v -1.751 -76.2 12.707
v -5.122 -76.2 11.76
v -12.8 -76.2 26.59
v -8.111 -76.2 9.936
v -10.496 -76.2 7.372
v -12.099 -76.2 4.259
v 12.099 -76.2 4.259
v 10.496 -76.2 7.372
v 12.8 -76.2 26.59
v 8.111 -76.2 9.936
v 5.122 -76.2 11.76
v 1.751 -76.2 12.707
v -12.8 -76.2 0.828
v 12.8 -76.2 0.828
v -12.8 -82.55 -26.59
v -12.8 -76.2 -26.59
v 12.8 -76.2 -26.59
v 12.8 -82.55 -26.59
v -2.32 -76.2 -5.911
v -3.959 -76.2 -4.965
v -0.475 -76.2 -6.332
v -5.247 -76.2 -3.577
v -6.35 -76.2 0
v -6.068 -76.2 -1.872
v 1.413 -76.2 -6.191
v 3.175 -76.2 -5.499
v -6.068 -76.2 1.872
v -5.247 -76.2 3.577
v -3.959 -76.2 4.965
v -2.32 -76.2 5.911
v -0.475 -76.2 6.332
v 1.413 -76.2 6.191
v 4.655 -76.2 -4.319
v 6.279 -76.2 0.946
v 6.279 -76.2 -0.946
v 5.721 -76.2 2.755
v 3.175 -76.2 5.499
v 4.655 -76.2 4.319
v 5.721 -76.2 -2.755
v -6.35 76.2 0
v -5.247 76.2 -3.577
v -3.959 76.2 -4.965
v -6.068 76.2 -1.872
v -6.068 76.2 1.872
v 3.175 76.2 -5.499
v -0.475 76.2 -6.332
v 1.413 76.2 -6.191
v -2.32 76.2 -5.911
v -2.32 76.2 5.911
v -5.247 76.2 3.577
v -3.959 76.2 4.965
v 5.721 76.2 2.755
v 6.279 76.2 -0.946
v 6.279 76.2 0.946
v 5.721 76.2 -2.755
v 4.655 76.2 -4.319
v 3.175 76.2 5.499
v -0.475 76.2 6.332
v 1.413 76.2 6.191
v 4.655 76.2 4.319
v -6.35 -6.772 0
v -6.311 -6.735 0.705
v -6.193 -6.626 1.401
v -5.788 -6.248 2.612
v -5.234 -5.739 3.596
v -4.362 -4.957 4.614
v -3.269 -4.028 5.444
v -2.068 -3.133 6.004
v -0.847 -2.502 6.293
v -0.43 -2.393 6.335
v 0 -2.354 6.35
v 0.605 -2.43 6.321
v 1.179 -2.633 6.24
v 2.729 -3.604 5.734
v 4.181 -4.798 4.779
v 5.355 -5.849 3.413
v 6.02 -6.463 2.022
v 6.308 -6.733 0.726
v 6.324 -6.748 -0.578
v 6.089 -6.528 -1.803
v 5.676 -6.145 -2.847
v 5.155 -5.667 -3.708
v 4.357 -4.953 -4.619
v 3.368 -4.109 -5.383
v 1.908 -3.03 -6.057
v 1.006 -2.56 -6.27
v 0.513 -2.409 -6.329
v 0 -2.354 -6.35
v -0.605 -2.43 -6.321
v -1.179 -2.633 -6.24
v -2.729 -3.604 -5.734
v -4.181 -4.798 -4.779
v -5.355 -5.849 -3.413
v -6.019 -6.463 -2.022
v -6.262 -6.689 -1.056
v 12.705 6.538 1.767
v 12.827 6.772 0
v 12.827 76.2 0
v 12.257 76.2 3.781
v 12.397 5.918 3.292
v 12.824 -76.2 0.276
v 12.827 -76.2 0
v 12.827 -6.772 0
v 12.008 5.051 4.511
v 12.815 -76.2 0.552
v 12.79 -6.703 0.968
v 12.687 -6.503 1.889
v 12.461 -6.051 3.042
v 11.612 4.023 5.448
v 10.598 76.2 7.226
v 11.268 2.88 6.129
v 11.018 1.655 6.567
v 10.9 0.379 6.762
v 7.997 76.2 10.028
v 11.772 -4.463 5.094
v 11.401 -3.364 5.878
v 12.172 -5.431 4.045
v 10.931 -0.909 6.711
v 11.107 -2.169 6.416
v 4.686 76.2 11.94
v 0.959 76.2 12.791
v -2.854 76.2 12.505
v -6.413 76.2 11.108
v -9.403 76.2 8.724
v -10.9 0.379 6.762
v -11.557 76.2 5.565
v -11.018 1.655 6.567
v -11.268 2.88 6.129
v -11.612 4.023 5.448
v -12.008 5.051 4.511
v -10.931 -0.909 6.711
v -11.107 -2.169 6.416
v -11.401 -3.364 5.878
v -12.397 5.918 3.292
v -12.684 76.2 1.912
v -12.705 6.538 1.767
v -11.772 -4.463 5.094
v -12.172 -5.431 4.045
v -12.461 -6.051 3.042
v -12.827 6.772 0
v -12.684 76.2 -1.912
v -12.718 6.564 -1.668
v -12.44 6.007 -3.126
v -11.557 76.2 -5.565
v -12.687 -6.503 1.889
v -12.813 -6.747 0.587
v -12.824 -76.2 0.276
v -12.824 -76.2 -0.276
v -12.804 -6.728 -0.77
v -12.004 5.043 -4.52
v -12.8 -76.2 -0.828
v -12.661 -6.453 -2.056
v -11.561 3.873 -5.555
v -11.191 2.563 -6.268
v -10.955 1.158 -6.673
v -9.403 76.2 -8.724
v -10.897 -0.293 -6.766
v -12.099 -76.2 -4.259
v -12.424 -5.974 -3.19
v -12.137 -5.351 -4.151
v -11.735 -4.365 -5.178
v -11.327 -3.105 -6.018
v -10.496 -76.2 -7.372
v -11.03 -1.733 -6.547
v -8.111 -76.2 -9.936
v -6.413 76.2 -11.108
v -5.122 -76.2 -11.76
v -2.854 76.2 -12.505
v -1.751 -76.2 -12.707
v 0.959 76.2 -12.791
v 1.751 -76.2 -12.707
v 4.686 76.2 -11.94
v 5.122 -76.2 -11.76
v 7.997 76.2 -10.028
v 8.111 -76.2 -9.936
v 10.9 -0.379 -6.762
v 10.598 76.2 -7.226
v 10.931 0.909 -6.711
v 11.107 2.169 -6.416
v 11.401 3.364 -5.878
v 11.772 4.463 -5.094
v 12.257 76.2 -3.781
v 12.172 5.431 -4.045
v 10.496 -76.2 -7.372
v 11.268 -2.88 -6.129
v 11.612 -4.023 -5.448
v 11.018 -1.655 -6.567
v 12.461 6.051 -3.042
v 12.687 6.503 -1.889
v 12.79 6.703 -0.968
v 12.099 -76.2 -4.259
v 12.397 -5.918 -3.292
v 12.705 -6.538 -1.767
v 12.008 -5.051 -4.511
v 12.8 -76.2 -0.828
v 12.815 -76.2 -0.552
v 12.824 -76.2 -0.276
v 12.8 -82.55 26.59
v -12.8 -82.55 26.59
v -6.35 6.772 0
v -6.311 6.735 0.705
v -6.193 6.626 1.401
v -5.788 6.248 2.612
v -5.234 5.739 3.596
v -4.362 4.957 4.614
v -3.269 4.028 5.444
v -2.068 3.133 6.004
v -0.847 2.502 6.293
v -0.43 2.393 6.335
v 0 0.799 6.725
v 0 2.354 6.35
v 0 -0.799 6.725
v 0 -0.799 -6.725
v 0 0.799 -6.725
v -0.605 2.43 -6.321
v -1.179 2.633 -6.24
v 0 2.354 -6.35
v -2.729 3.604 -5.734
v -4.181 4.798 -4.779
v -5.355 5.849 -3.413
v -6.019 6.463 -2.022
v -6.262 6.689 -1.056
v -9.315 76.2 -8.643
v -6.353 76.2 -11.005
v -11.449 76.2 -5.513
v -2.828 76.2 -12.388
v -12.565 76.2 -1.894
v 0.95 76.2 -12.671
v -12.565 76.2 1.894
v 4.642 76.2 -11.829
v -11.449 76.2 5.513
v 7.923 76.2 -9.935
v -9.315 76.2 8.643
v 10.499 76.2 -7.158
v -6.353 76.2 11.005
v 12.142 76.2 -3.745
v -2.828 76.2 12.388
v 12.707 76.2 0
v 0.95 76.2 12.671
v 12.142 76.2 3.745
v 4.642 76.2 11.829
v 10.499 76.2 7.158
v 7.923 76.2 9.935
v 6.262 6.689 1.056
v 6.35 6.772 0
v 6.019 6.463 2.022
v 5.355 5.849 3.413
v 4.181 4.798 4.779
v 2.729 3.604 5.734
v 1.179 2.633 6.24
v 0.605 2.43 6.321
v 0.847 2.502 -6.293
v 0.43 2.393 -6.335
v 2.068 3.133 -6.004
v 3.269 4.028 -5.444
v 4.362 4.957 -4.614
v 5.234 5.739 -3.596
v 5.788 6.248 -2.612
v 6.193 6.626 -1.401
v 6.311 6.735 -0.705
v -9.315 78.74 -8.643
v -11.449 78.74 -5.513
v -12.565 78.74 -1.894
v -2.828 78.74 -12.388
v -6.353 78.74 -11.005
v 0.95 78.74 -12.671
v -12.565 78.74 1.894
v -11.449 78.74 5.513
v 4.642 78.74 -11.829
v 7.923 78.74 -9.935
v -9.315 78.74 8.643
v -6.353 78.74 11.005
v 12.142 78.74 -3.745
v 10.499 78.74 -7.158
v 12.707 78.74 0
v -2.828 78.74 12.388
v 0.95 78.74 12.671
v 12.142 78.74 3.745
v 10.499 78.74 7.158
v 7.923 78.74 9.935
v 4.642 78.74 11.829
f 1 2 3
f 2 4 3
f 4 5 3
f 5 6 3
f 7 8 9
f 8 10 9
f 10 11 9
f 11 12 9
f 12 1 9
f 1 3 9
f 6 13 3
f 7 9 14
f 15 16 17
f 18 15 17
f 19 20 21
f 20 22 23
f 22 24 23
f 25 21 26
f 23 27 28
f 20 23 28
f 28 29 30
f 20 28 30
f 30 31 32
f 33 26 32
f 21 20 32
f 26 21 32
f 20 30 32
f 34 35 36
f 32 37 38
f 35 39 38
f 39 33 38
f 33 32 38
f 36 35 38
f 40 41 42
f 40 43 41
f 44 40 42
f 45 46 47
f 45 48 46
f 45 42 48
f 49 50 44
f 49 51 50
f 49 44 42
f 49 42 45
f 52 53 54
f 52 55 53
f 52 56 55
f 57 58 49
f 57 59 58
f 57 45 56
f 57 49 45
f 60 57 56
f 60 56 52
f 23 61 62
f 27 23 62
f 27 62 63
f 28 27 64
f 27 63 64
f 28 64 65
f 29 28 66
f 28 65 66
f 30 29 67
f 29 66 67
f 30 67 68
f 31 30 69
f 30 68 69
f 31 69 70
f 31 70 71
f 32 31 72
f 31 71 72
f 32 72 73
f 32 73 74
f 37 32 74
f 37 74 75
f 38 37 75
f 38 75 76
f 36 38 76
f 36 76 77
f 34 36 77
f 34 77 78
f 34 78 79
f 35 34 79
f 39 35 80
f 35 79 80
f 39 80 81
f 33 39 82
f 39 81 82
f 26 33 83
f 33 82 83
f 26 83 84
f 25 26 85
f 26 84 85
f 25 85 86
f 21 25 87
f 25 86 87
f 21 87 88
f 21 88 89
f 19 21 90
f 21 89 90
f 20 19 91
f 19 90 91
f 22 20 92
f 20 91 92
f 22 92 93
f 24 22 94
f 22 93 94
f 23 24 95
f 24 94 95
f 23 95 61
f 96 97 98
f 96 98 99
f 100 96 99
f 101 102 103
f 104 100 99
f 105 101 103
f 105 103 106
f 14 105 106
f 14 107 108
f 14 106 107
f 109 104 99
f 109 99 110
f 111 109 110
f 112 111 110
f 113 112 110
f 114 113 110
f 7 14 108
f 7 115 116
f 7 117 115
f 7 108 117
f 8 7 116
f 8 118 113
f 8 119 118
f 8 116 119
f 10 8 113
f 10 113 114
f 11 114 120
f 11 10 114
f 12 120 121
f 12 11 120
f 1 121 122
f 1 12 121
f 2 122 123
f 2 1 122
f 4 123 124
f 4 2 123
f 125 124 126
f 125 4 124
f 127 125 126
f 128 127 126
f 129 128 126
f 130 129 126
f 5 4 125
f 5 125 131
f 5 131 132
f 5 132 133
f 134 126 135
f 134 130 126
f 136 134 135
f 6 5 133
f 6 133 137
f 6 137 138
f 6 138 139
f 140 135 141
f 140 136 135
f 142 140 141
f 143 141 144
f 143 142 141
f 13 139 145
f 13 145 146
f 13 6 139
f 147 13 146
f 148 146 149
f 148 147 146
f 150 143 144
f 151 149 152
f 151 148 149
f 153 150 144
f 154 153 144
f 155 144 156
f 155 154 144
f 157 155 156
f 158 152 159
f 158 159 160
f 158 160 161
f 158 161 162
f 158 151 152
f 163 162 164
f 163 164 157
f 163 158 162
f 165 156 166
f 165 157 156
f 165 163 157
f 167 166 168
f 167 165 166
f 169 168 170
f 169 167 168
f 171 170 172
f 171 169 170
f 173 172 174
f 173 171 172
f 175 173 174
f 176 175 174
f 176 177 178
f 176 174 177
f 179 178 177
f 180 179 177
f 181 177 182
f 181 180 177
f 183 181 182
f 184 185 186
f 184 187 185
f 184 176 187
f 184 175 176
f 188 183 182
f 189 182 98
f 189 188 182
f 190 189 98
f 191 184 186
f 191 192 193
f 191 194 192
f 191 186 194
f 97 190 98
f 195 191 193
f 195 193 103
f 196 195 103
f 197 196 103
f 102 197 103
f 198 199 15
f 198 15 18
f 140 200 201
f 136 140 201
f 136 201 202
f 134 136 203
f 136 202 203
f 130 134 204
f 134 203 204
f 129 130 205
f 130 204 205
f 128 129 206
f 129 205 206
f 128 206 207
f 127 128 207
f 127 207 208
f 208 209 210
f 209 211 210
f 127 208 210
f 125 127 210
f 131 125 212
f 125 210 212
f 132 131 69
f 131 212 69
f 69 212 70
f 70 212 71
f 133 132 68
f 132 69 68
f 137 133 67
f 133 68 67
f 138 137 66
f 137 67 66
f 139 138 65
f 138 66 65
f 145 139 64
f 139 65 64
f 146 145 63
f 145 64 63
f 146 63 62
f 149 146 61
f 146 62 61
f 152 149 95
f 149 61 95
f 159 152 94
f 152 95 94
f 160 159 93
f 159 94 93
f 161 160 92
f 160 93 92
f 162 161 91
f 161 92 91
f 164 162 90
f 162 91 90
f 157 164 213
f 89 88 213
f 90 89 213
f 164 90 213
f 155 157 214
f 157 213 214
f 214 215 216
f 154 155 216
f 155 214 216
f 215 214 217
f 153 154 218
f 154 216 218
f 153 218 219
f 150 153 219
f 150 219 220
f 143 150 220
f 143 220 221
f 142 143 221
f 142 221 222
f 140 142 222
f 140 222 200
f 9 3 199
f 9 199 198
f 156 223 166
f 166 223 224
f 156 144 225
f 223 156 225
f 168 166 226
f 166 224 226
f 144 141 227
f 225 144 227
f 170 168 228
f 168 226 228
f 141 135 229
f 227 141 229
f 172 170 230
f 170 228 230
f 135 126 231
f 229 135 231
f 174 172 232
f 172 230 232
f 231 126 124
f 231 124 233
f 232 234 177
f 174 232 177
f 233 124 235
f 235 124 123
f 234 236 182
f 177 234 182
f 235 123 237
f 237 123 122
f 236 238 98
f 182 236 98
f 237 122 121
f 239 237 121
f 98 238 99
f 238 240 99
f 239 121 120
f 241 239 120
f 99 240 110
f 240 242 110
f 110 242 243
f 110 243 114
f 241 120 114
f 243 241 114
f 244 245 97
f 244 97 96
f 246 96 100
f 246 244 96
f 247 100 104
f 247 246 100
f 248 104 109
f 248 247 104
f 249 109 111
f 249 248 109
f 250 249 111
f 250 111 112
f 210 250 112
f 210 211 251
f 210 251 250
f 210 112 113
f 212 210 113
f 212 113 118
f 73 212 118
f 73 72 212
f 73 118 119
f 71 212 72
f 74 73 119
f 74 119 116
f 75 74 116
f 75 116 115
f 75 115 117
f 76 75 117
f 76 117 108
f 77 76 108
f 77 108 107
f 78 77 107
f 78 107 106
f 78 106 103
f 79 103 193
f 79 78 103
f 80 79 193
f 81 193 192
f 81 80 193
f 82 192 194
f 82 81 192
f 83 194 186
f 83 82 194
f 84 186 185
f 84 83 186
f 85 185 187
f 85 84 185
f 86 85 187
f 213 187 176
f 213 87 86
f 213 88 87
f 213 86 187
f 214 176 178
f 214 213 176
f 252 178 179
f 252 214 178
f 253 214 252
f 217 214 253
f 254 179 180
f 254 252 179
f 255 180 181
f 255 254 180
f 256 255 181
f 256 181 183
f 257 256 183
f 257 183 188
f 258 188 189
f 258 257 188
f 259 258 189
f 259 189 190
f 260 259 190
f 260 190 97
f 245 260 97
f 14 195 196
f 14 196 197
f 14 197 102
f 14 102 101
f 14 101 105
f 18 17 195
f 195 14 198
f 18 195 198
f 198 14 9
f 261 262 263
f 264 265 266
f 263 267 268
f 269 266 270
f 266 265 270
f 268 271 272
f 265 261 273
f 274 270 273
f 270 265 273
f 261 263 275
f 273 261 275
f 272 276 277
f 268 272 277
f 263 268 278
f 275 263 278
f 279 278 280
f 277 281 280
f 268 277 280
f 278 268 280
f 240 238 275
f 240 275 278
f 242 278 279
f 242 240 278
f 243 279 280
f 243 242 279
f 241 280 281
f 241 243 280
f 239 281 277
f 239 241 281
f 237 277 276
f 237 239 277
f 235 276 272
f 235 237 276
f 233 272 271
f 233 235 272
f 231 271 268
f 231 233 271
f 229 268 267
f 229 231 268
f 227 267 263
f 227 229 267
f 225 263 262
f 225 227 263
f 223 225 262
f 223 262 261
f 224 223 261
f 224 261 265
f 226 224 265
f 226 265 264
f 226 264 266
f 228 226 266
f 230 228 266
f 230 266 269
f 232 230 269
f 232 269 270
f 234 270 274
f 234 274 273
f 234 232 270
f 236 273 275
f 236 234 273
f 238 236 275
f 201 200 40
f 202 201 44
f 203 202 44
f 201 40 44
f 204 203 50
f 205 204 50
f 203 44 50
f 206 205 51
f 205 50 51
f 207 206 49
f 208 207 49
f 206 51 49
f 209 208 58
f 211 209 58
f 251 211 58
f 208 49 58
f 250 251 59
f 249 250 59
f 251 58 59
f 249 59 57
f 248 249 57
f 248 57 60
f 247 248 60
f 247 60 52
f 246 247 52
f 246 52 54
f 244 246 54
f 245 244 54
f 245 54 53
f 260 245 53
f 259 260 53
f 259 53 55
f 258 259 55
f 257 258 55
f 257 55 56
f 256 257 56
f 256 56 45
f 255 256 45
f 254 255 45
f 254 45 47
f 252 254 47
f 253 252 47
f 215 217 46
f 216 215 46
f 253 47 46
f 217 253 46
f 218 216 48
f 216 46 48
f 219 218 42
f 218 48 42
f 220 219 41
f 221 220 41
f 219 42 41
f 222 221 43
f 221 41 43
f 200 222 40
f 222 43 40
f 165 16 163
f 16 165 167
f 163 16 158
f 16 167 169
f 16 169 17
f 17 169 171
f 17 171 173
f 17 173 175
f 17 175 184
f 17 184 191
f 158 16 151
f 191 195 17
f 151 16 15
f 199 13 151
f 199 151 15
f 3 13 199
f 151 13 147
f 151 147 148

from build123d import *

# Parameters (mm, degrees)
F1_R           = 12.826844
F2_DEPTH       = 76.2
F2_DEPTH_BACK  = 76.2
F3_D           = 12.7
F4_D           = 12.7
F5_W           = 25.60015
F5_H           = 53.179082
F6_DEPTH       = 6.35
F8_R           = 12.706951
F9_DEPTH       = 2.54
F11_D          = 6.35
F10_R          = 6.772229
F12_DEPTH      = 50.8
F12_DEPTH_BACK = 50.8


with BuildPart() as f2:
    # F1 (on Front) → F2 (new body, two sides)
    with BuildSketch(Plane.XZ) as f2_sk:
        Circle(F1_R)
    extrude(amount=F2_DEPTH)
    extrude(f2_sk.sketch, amount=-F2_DEPTH_BACK)

    # F3 (through all)
    with Locations(Plane.XZ):
        with Locations((0, 0)):
            Hole(F3_D / 2)

    # F4 (through all)
    with Locations(Plane(origin=(0, 0, 0), x_dir=(1, 0, 0), z_dir=(0, 1, 0))):
        with Locations((0, 0)):
            Hole(F4_D / 2)

    # F5 (on offset) → F6 (join)
    with BuildSketch(Plane.XZ.offset(76.2)):
        Rectangle(F5_W, F5_H)
    extrude(amount=F6_DEPTH)

    # F8 (on offset) → F9 (join)
    with BuildSketch(Plane.XZ.offset(-76.2)):
        Circle(F8_R)
    extrude(amount=-F9_DEPTH)

    # F11 (through all)
    with Locations(Plane.YZ):
        with Locations((0, 0)):
            Hole(F11_D / 2)

    # F10 (on Right) → F12 (cut, two sides)
    with BuildSketch(Plane.YZ) as f12_sk:
        Circle(F10_R)
    extrude(amount=F12_DEPTH, mode=Mode.SUBTRACT)
    extrude(f12_sk.sketch, amount=-F12_DEPTH_BACK, mode=Mode.SUBTRACT)


solid = f2.part
